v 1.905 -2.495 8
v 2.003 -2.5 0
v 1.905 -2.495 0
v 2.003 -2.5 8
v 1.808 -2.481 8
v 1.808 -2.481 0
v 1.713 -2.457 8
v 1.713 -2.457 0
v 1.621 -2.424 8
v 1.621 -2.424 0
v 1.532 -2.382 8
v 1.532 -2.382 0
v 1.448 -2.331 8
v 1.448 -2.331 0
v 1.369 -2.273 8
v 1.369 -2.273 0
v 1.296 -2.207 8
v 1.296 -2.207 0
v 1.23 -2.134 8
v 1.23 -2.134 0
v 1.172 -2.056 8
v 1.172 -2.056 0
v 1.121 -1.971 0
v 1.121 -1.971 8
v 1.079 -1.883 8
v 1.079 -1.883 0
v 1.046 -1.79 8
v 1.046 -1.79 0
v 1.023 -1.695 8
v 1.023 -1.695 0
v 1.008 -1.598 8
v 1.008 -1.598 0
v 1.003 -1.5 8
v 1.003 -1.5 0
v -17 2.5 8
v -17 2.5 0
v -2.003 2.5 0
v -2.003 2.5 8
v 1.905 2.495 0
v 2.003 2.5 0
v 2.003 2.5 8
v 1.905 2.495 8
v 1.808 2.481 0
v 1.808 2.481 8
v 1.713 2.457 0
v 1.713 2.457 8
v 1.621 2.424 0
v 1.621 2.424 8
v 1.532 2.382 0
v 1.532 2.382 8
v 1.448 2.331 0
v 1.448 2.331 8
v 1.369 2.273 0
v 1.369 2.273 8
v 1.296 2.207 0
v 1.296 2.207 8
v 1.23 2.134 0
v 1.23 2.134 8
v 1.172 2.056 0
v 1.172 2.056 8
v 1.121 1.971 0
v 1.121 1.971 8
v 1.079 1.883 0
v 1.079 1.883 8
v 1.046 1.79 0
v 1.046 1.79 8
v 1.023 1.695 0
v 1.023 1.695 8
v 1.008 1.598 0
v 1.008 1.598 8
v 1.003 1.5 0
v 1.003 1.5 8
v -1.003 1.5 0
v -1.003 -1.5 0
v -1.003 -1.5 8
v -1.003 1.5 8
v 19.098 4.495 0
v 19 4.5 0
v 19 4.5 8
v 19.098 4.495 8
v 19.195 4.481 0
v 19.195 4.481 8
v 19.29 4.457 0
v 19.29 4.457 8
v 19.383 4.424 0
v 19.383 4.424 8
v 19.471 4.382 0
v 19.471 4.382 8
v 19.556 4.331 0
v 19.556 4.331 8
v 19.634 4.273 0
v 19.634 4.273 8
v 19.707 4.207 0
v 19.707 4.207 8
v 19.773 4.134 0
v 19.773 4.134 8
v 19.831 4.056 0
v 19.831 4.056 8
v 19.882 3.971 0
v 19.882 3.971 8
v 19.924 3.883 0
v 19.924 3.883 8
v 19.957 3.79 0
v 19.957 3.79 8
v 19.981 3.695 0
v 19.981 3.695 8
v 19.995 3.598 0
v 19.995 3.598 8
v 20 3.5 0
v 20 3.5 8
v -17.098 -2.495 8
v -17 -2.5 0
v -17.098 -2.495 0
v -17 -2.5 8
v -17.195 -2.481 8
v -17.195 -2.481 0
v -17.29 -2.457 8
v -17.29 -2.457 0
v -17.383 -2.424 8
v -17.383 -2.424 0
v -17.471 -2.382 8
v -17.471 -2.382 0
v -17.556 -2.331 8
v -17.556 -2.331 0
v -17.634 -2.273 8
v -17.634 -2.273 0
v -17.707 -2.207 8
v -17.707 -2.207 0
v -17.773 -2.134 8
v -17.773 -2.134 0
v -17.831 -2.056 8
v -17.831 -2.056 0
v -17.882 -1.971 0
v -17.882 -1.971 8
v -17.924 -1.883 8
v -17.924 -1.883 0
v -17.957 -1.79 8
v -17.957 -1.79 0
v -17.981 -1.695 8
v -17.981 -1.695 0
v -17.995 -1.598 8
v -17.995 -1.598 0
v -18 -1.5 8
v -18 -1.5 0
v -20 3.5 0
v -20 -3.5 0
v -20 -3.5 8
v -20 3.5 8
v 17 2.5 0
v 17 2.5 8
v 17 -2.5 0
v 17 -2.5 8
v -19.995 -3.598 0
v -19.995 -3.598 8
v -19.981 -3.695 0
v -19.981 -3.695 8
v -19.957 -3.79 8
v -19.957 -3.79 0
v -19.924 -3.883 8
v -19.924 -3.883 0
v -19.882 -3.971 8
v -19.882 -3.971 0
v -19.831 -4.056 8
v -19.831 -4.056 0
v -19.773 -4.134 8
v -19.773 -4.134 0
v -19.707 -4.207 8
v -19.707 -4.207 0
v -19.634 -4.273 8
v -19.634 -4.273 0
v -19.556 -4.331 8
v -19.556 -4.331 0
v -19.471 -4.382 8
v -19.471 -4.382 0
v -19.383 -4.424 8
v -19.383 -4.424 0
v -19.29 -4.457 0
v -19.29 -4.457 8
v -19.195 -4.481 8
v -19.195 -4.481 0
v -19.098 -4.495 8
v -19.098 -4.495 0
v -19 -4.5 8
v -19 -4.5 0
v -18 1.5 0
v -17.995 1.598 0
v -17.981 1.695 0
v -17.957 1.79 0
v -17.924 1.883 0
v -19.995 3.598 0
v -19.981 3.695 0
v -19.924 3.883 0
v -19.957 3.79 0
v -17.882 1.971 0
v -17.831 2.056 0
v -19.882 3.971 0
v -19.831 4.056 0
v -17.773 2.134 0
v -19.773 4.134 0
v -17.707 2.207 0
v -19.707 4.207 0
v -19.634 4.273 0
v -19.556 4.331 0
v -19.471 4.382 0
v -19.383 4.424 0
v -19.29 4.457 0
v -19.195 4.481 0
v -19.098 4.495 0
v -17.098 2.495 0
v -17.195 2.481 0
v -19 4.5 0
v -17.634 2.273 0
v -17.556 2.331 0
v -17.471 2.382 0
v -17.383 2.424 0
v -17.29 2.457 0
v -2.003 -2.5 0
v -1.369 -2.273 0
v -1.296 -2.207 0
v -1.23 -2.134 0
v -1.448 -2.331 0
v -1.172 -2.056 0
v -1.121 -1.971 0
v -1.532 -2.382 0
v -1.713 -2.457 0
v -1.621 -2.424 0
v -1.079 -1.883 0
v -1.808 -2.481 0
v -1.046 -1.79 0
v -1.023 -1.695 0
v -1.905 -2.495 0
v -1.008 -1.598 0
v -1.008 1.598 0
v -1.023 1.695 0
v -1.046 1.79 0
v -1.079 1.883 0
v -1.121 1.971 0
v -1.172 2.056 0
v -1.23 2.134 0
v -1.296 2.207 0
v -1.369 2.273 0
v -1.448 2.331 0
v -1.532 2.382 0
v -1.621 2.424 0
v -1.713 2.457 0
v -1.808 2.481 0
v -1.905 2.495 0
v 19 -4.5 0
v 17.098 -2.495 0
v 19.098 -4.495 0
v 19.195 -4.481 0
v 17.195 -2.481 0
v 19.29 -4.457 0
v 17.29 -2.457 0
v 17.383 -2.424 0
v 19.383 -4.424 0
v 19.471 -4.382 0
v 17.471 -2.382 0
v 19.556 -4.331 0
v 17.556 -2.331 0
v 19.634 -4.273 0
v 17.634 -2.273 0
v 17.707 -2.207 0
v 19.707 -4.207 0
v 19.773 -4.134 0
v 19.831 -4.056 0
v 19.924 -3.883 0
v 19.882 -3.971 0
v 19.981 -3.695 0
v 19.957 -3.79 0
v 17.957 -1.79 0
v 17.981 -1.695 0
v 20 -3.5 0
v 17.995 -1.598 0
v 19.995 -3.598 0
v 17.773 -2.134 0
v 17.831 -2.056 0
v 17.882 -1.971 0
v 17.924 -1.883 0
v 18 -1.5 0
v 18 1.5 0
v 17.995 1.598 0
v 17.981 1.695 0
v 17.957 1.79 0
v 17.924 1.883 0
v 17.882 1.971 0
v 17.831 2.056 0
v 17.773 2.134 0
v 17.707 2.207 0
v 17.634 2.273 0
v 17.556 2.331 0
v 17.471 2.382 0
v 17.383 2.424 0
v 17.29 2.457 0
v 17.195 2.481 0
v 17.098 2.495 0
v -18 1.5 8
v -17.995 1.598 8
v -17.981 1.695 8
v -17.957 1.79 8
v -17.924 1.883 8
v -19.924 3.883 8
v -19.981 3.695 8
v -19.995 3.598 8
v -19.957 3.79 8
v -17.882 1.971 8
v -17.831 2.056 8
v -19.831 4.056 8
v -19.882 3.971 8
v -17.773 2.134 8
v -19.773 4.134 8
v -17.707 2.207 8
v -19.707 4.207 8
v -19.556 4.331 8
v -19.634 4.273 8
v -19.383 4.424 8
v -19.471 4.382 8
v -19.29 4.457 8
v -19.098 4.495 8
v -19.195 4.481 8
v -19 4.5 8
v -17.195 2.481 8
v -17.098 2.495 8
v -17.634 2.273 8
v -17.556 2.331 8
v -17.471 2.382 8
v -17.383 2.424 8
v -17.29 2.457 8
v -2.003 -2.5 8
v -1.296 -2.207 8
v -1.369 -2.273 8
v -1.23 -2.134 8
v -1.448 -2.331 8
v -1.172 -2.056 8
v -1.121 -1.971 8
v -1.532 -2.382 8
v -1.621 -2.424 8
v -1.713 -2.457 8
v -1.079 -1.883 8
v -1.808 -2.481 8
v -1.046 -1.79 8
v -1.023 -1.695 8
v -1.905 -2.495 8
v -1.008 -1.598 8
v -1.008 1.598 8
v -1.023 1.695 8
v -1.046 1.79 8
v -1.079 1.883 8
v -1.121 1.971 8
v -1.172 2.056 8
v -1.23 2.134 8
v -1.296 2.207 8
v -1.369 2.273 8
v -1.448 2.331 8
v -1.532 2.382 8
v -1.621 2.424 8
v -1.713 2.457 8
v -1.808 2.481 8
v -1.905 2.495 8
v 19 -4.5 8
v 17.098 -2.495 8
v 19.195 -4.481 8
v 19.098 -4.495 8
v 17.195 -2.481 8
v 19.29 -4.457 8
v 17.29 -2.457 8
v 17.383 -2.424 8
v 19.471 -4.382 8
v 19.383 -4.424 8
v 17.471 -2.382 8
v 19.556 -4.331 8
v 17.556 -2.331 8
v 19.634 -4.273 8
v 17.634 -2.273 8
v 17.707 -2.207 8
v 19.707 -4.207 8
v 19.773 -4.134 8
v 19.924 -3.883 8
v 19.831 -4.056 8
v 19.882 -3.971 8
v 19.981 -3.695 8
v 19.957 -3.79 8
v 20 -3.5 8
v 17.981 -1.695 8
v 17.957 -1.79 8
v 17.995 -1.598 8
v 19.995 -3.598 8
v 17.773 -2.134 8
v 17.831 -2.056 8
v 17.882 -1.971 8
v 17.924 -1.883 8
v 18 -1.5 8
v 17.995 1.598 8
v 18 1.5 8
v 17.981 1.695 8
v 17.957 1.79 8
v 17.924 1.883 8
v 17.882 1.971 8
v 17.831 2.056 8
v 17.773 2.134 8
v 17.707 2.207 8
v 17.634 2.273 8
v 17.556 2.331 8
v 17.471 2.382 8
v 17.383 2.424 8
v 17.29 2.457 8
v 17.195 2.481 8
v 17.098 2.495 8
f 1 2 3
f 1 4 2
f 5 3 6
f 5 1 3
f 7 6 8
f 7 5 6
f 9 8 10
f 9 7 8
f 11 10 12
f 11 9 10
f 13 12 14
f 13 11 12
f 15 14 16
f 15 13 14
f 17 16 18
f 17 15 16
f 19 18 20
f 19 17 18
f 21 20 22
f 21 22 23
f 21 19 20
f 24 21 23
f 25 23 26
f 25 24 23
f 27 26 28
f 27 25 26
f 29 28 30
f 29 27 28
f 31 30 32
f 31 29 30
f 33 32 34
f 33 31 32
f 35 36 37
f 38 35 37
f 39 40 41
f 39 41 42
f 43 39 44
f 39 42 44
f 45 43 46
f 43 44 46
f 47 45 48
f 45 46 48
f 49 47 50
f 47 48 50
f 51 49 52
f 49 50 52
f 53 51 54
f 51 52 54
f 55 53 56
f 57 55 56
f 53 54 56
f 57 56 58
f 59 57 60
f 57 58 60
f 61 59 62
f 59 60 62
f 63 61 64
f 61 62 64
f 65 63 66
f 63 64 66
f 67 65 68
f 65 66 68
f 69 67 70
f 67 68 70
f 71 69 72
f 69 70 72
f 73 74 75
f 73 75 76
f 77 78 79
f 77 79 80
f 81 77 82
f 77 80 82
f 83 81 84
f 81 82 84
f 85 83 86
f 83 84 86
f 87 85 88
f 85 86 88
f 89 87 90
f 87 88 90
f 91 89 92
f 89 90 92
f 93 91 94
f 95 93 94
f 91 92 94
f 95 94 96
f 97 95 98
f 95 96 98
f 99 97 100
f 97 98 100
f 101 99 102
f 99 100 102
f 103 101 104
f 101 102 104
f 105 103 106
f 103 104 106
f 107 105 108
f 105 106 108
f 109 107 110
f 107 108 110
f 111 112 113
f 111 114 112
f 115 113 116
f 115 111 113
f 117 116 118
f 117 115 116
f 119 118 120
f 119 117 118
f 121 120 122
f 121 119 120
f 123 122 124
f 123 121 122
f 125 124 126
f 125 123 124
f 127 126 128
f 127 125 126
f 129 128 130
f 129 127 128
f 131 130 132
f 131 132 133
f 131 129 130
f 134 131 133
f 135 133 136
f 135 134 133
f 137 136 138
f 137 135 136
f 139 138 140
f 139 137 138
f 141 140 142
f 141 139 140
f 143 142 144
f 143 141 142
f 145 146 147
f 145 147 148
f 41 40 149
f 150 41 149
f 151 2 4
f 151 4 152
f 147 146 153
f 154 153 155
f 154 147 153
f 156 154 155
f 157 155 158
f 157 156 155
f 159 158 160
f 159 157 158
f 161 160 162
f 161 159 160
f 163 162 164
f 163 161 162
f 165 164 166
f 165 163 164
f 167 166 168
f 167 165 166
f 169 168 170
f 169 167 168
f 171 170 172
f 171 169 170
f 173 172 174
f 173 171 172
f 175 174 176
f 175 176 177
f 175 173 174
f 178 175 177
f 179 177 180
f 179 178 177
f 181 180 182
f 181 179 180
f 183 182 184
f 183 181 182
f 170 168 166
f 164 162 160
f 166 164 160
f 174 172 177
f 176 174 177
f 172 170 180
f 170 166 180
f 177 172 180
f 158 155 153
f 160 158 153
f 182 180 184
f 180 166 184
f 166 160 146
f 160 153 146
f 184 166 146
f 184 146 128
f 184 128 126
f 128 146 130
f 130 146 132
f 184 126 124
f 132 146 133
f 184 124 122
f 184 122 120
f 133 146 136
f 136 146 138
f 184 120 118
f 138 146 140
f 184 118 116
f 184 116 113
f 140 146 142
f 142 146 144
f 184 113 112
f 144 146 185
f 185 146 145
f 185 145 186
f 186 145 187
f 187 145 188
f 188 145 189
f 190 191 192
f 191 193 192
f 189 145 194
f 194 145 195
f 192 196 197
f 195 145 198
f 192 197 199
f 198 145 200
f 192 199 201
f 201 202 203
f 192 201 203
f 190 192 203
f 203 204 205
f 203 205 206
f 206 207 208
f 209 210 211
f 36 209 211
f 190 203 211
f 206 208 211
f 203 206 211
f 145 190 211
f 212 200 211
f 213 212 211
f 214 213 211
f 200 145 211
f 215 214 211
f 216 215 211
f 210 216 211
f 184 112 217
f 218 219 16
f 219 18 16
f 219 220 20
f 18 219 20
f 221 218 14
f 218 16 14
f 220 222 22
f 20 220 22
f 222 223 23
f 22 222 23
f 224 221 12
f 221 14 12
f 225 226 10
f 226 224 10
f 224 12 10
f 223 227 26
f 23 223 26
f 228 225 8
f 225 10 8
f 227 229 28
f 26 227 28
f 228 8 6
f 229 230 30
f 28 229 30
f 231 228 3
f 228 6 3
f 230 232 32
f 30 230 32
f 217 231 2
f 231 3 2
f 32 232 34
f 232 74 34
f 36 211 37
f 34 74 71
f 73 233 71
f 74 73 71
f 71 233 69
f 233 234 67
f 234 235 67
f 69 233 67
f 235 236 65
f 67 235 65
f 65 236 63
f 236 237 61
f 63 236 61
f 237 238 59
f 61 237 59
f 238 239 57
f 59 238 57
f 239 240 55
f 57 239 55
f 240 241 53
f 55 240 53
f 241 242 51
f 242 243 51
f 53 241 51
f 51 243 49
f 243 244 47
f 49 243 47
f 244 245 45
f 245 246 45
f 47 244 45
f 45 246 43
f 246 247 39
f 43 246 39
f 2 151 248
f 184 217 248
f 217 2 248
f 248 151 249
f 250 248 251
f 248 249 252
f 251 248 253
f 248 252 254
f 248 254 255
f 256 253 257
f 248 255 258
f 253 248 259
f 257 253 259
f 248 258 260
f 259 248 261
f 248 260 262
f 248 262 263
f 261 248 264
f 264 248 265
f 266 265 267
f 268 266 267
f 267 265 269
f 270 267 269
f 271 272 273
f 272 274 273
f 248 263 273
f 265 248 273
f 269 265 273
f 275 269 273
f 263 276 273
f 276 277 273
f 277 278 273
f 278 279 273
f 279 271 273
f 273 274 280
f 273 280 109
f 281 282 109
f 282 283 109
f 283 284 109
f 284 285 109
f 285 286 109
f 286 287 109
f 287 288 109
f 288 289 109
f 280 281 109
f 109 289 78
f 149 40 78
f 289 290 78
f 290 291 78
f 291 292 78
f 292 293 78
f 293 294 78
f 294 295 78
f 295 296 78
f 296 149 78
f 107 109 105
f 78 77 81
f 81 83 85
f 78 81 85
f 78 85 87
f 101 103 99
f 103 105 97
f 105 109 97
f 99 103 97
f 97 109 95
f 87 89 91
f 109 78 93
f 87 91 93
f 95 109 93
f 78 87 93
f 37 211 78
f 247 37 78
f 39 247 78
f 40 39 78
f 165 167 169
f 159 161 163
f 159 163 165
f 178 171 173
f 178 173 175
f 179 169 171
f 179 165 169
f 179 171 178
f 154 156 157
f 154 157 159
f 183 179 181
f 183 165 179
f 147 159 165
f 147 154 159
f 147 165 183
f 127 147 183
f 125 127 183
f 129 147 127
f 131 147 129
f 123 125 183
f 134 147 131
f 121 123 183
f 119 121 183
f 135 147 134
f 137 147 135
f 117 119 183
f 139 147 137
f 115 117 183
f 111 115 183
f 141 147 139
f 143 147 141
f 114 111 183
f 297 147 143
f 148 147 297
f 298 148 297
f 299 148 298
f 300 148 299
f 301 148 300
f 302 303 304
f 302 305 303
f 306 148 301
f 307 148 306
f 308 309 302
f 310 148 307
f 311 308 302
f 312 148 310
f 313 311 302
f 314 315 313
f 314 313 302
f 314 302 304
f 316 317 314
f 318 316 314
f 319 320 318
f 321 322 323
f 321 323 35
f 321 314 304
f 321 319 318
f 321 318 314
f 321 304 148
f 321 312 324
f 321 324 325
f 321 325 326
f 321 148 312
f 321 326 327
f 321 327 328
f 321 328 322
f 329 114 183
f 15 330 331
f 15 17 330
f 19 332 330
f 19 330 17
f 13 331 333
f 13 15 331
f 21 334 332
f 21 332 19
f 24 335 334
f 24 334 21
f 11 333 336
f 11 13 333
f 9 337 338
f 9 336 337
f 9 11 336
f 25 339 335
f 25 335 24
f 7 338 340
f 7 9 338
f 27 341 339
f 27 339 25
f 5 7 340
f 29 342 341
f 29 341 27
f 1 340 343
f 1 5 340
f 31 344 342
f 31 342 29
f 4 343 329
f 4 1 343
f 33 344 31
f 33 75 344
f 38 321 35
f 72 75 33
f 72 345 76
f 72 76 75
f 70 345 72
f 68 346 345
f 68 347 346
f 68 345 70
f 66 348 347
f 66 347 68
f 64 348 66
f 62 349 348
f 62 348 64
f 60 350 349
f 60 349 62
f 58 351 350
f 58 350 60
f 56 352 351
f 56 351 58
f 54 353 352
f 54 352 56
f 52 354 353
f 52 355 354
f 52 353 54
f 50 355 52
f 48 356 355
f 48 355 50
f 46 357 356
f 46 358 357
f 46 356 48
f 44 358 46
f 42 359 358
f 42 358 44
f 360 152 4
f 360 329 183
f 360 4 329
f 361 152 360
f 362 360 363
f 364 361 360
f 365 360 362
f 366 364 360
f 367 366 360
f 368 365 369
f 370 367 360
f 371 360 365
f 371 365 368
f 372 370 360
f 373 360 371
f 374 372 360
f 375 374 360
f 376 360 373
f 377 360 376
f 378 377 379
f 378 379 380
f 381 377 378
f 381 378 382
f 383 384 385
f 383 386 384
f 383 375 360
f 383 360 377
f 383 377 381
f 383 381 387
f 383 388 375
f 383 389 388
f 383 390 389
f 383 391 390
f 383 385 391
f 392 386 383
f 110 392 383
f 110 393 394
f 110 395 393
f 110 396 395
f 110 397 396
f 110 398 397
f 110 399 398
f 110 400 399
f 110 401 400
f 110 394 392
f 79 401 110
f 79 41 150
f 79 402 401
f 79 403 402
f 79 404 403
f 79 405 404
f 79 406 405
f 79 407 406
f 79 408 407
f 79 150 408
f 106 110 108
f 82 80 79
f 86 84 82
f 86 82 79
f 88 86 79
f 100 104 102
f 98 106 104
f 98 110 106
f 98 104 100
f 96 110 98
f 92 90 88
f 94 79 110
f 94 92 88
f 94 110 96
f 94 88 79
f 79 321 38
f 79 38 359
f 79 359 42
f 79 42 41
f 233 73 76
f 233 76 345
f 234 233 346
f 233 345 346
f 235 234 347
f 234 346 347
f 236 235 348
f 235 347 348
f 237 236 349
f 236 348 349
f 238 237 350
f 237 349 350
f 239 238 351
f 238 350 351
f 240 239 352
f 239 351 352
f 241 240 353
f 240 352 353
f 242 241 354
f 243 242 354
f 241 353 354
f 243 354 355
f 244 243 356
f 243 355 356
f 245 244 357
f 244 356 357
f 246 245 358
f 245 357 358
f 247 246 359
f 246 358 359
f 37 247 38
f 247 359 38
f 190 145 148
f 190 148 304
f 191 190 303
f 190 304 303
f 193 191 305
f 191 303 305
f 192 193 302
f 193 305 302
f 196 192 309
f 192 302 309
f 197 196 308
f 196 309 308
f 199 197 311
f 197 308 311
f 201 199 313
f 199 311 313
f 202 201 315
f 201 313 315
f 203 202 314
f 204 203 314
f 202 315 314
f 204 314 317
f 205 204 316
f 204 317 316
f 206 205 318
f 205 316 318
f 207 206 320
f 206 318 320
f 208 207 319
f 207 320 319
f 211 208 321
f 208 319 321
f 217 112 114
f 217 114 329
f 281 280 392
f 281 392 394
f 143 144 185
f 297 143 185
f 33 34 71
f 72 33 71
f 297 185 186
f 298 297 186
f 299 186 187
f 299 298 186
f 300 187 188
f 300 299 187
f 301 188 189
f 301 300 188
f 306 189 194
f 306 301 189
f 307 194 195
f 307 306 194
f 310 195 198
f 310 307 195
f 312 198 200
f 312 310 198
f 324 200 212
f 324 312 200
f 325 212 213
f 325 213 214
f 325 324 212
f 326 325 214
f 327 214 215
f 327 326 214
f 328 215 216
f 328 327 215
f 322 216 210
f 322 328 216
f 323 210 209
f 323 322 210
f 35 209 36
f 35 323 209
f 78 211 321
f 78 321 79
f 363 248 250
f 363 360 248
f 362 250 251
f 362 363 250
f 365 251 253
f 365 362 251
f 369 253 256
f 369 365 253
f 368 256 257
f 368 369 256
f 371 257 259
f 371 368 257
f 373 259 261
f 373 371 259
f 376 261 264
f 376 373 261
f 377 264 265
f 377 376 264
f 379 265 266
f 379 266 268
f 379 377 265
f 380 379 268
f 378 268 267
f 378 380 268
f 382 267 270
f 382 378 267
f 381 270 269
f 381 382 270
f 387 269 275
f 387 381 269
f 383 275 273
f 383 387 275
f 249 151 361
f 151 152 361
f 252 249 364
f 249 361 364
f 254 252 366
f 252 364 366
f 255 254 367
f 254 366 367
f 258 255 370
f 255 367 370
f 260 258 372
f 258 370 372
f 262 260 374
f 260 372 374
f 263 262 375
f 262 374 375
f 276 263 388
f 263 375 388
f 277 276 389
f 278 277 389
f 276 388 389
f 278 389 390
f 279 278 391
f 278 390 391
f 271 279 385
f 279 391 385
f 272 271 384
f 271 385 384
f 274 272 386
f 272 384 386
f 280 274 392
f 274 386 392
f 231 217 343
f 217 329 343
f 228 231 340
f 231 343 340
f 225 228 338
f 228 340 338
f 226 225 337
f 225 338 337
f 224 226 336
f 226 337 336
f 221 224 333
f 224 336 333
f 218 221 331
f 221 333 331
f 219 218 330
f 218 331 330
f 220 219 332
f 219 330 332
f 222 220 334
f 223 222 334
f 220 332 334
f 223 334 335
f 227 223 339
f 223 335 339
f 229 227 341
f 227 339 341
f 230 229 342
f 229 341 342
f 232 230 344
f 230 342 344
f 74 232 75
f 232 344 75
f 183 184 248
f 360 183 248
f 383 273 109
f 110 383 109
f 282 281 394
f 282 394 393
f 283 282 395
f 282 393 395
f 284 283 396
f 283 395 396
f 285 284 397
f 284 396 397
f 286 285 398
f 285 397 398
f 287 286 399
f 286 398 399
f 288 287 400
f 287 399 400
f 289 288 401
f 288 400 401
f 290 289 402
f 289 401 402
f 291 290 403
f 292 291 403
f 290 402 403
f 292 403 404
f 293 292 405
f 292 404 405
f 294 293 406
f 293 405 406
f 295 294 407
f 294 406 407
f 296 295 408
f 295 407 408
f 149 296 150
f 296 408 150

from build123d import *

# Parameters (mm, degrees)
F0_W     = 40
F0_H     = 9
F0_W_2   = 16.9967
F0_H_2   = 5
F1_DEPTH = 8
F2_R     = 1
F3_R     = 1


with BuildPart() as f1:
    # F0 (on Top) → F1 (new body)
    with BuildSketch(Plane.XY):
        Rectangle(F0_W, F0_H)
        with Locations((-9.50165, 0)):
            Rectangle(F0_W_2, F0_H_2, mode=Mode.SUBTRACT)
        with Locations((9.50165, 0)):
            Rectangle(F0_W_2, F0_H_2, mode=Mode.SUBTRACT)
    extrude(amount=F1_DEPTH)

    # F2
    f2_edges = [f1.edges().sort_by_distance(p)[0] for p in [
        (-20, -4.5, 4),
        (-20, 4.5, 4),
        (20, -4.5, 4),
        (20, 4.5, 4),
    ]]
    fillet(f2_edges, radius=F2_R)

    # F3
    f3_edges = [f1.edges().sort_by_distance(p)[0] for p in [
        (1.0033, -2.5, 4),
        (1.0033, 2.5, 4),
        (-1.0033, 2.5, 4),
        (-1.0033, -2.5, 4),
        (-18, -2.5, 4),
        (-18, 2.5, 4),
        (18, 2.5, 4),
        (18, -2.5, 4),
    ]]
    fillet(f3_edges, radius=F3_R)


solid = f1.part
